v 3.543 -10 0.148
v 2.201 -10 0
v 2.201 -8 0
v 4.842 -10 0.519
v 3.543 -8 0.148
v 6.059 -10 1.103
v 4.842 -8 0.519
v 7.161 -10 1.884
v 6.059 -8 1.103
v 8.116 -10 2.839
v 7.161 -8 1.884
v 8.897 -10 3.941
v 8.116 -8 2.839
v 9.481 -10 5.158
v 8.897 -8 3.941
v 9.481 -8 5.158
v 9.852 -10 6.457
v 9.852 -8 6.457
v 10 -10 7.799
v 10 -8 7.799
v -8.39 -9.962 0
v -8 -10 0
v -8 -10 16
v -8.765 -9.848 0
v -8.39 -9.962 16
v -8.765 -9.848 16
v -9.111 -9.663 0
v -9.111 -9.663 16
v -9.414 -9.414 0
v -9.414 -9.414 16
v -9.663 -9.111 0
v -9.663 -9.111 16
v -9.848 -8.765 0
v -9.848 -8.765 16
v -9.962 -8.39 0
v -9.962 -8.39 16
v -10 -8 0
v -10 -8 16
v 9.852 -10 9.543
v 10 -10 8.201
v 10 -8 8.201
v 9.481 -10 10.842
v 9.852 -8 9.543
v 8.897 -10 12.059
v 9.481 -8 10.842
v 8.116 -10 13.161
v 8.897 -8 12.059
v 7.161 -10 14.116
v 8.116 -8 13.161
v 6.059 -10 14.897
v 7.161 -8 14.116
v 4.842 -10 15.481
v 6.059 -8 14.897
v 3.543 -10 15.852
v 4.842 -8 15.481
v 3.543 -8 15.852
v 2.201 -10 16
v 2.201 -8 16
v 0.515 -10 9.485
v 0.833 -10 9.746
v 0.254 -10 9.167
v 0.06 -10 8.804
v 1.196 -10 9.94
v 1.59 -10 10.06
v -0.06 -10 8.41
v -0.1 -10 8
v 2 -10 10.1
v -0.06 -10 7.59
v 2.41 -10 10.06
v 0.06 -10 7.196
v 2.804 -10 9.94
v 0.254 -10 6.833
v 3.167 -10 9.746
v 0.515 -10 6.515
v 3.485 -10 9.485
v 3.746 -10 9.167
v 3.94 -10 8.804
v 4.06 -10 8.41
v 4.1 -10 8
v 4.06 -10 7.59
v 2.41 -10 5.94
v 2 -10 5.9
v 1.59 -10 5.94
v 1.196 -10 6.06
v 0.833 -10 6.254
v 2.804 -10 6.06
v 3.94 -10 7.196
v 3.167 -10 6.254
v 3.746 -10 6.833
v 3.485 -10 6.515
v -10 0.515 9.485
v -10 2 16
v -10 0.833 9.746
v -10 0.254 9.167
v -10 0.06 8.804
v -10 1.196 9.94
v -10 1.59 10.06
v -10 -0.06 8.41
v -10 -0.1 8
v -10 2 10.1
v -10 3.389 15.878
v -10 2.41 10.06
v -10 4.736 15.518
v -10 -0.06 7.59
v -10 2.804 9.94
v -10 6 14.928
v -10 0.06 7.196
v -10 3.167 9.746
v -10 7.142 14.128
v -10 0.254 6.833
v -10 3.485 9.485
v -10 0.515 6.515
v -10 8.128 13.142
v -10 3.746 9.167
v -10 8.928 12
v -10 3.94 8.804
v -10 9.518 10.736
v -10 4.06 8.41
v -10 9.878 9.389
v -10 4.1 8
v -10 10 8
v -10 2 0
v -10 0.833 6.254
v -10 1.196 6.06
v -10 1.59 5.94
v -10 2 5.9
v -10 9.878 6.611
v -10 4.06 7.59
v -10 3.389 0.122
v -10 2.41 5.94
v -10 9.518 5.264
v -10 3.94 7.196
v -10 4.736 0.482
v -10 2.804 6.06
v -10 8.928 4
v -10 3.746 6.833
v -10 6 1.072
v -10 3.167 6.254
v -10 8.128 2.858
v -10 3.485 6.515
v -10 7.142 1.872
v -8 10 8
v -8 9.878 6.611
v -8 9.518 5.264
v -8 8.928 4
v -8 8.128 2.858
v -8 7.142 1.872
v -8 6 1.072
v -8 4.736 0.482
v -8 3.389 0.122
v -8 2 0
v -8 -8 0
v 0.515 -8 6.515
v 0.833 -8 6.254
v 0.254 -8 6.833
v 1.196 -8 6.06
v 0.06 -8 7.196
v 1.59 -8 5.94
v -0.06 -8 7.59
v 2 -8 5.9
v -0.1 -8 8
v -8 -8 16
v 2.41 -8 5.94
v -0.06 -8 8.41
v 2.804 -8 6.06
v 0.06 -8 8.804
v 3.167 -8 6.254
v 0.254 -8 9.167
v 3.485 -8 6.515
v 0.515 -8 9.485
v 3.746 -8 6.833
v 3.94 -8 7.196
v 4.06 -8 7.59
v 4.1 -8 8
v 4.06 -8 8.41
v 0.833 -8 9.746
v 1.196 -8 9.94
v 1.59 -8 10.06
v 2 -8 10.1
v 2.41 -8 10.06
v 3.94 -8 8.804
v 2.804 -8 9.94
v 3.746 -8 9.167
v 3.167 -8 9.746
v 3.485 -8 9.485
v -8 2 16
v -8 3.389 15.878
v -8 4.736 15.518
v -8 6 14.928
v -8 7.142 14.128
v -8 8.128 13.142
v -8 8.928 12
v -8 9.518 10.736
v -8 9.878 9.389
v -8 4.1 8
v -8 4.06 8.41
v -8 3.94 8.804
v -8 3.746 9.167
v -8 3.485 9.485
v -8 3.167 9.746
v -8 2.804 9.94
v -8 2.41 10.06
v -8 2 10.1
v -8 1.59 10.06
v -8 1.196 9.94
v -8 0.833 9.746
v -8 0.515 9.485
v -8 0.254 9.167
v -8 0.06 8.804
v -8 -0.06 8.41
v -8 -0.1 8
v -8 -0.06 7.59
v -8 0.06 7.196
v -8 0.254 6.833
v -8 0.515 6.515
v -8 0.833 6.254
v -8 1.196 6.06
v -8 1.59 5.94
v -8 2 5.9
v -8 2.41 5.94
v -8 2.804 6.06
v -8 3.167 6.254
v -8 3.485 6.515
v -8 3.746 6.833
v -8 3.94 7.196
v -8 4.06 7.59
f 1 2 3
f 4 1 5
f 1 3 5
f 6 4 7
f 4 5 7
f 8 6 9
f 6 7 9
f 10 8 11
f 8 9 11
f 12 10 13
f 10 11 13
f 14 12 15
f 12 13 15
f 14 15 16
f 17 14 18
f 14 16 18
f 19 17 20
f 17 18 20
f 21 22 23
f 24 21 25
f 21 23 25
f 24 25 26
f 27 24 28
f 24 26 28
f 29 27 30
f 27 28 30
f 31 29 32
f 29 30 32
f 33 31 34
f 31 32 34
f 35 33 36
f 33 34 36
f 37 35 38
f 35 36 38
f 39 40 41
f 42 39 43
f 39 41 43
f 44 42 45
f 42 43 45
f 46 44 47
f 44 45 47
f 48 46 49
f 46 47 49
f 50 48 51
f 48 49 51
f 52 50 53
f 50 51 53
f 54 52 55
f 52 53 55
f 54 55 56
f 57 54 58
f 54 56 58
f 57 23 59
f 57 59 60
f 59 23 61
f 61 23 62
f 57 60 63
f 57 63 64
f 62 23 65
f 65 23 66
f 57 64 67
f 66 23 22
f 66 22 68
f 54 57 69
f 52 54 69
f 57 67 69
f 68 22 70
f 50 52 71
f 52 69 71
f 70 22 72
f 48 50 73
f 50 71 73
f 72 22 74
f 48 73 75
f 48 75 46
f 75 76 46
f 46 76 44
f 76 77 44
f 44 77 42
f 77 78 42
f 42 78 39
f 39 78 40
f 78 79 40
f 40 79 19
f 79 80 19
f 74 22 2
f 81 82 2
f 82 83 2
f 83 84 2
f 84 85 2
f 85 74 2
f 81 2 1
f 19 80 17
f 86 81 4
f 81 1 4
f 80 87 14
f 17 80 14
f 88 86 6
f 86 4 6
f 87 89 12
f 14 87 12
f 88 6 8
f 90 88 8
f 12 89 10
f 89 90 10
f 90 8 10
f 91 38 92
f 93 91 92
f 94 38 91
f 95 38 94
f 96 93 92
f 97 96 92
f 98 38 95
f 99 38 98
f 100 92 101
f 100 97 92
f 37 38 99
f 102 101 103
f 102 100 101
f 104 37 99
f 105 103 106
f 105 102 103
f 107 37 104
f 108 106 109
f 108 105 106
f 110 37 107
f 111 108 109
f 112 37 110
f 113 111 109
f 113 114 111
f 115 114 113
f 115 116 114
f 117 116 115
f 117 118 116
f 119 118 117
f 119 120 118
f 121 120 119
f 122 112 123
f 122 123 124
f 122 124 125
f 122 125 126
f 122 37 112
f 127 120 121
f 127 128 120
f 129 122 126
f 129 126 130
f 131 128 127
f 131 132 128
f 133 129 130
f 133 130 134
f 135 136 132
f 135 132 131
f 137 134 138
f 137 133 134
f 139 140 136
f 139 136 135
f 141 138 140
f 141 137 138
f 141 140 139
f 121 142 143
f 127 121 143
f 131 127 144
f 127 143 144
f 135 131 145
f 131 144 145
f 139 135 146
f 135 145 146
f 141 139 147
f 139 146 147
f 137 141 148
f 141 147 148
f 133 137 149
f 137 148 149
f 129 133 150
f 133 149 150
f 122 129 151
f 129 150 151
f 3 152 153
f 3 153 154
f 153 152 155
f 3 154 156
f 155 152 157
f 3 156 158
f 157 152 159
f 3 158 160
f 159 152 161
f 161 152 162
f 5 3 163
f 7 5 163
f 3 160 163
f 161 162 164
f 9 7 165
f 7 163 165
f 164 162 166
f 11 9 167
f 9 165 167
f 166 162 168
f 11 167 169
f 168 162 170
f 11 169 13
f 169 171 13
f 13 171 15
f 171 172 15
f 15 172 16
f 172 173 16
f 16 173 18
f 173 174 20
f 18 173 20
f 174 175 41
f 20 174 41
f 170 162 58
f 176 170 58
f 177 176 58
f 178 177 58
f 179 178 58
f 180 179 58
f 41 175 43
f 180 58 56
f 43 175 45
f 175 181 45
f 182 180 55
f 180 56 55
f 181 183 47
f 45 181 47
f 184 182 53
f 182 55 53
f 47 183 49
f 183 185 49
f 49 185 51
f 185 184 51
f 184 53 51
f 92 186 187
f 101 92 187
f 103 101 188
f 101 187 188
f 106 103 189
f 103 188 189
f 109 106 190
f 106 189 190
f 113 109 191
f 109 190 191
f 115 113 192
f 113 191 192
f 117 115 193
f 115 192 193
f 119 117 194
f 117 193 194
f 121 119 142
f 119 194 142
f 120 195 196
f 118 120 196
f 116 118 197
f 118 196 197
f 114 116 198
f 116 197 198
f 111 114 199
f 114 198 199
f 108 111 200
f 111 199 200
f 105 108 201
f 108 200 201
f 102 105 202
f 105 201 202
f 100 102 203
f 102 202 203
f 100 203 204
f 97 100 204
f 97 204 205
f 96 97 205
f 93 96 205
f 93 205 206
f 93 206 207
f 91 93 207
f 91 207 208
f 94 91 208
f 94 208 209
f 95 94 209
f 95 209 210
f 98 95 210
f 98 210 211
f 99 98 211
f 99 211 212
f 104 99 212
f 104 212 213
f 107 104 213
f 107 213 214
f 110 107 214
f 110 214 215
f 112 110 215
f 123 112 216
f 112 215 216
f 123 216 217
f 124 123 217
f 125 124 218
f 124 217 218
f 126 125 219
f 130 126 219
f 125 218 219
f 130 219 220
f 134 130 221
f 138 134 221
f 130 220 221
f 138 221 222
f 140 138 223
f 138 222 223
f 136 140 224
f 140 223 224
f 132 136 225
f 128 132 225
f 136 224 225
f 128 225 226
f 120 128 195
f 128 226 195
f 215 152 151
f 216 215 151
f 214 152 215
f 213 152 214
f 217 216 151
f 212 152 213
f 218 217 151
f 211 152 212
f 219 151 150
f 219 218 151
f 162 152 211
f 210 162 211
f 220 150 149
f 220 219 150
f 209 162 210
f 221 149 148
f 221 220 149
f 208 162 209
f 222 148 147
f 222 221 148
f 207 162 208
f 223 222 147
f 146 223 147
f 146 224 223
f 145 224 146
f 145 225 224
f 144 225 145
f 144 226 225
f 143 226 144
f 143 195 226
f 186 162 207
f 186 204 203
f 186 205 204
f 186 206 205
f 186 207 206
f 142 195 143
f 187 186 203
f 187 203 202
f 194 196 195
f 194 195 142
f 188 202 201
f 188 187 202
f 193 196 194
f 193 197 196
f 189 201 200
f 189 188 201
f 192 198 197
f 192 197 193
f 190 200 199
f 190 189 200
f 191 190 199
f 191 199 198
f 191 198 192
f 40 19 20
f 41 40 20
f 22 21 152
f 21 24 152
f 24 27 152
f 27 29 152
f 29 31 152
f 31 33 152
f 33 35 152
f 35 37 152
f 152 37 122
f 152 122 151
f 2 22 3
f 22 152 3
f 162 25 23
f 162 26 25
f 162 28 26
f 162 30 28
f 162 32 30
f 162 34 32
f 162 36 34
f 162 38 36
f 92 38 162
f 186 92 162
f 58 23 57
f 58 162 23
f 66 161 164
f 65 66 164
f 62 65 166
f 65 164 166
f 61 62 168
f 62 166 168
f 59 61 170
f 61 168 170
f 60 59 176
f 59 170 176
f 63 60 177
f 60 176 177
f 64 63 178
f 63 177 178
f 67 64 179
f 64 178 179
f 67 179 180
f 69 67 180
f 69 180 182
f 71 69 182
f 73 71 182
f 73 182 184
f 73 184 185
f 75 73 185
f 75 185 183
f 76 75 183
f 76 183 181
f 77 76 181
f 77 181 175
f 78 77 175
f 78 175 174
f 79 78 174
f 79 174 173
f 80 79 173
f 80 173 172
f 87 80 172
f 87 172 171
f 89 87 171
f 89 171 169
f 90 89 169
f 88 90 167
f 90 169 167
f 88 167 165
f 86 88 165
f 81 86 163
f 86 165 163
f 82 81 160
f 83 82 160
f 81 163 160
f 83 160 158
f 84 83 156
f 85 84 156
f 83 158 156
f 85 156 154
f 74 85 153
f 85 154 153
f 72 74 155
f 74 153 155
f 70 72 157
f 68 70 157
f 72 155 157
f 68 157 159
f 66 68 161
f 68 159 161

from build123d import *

# Parameters (mm, degrees)
SKETCH_1_W          = 20
SKETCH_1_H          = 20
EXTRUDE_1_DEPTH     = 16
SKETCH_2_W          = 18
SKETCH_2_H          = 18
CUT_EXTRUDE_1_DEPTH = 16
SKETCH_3_R          = 2.1
CUT_EXTRUDE_2_DEPTH = 16
SKETCH_4_R          = 2.1
CUT_EXTRUDE_3_DEPTH = 16
CUT_EXTRUDE_4_DEPTH = 16
CUT_EXTRUDE_5_DEPTH = 16
CUT_EXTRUDE_6_DEPTH = 16


with BuildPart() as part:
    # 草图1 → 凸台-拉伸1 (new body)
    with BuildSketch(Plane.XY):
        Rectangle(SKETCH_1_W, SKETCH_1_H)
    extrude(amount=EXTRUDE_1_DEPTH)

    # 草图2 → 切除-拉伸1 (cut)
    with BuildSketch(Plane.XY.offset(16)):
        with Locations((1, 1)):
            Rectangle(SKETCH_2_W, SKETCH_2_H)
    extrude(amount=-CUT_EXTRUDE_1_DEPTH, mode=Mode.SUBTRACT)

    # 草图3 → 切除-拉伸2 (cut)
    with BuildSketch(Plane(origin=(-8, 0, 0), x_dir=(0, 0, -1), z_dir=(1, 0, 0))):
        with Locations(Location((-8, 2, 0), (0, 0, 90))):
            Circle(SKETCH_3_R)
    extrude(amount=-CUT_EXTRUDE_2_DEPTH, mode=Mode.SUBTRACT)

    # 草图4 → 切除-拉伸3 (cut)
    with BuildSketch(Plane(origin=(0, -8, 0), x_dir=(1, 0, 0), z_dir=(0, 1, 0))):
        with Locations(Location((2, -8, 0), (0, 0, 180))):
            Circle(SKETCH_4_R)
    extrude(amount=-CUT_EXTRUDE_3_DEPTH, mode=Mode.SUBTRACT)

    # 草图5 → 切除-拉伸4 (cut)
    with BuildSketch(Plane(origin=(-8, 0, 0), x_dir=(0, 0, -1), z_dir=(1, 0, 0))):
        with BuildLine():
            Line((-16, 10), (-16, 2))
            ThreePointArc((-16, 2), (-13.656854261, 7.656854238), (-8.000000031, 10))
            Line((-8.000000031, 10), (-16, 10))
        make_face()
        with BuildLine():
            Line((0, 10), (-8.000000031, 10))
            ThreePointArc((-8.000000031, 10), (-2.343145762, 7.656854261), (0, 2))
            Line((0, 2), (0, 10))
        make_face()
    extrude(amount=-CUT_EXTRUDE_4_DEPTH, mode=Mode.SUBTRACT)

    # 草图6 → 切除-拉伸5 (cut)
    with BuildSketch(Plane(origin=(0, -8, 0), x_dir=(1, 0, 0), z_dir=(0, 1, 0))):
        with BuildLine():
            Line((10, -7.79882112), (10, 0))
            Line((10, 0), (2.20117888, 0))
            ThreePointArc((2.20117888, 0), (7.658642635, -2.341357365), (10, -7.79882112))
        make_face()
        with BuildLine():
            Line((10, -16), (10, -8.20117888))
            ThreePointArc((10, -8.20117888), (7.658642635, -13.658642635), (2.20117888, -16))
            Line((2.20117888, -16), (10, -16))
        make_face()
    extrude(amount=-CUT_EXTRUDE_5_DEPTH, mode=Mode.SUBTRACT)

    # 草图7 → 切除-拉伸6 (cut)
    with BuildSketch(Plane.XY.offset(16)):
        with BuildLine():
            Line((-10, -8), (-10, -10))
            Line((-10, -10), (-8, -10))
            ThreePointArc((-8, -10), (-9.414213562, -9.414213562), (-10, -8))
        make_face()
    extrude(amount=-CUT_EXTRUDE_6_DEPTH, mode=Mode.SUBTRACT)


solid = part.part
